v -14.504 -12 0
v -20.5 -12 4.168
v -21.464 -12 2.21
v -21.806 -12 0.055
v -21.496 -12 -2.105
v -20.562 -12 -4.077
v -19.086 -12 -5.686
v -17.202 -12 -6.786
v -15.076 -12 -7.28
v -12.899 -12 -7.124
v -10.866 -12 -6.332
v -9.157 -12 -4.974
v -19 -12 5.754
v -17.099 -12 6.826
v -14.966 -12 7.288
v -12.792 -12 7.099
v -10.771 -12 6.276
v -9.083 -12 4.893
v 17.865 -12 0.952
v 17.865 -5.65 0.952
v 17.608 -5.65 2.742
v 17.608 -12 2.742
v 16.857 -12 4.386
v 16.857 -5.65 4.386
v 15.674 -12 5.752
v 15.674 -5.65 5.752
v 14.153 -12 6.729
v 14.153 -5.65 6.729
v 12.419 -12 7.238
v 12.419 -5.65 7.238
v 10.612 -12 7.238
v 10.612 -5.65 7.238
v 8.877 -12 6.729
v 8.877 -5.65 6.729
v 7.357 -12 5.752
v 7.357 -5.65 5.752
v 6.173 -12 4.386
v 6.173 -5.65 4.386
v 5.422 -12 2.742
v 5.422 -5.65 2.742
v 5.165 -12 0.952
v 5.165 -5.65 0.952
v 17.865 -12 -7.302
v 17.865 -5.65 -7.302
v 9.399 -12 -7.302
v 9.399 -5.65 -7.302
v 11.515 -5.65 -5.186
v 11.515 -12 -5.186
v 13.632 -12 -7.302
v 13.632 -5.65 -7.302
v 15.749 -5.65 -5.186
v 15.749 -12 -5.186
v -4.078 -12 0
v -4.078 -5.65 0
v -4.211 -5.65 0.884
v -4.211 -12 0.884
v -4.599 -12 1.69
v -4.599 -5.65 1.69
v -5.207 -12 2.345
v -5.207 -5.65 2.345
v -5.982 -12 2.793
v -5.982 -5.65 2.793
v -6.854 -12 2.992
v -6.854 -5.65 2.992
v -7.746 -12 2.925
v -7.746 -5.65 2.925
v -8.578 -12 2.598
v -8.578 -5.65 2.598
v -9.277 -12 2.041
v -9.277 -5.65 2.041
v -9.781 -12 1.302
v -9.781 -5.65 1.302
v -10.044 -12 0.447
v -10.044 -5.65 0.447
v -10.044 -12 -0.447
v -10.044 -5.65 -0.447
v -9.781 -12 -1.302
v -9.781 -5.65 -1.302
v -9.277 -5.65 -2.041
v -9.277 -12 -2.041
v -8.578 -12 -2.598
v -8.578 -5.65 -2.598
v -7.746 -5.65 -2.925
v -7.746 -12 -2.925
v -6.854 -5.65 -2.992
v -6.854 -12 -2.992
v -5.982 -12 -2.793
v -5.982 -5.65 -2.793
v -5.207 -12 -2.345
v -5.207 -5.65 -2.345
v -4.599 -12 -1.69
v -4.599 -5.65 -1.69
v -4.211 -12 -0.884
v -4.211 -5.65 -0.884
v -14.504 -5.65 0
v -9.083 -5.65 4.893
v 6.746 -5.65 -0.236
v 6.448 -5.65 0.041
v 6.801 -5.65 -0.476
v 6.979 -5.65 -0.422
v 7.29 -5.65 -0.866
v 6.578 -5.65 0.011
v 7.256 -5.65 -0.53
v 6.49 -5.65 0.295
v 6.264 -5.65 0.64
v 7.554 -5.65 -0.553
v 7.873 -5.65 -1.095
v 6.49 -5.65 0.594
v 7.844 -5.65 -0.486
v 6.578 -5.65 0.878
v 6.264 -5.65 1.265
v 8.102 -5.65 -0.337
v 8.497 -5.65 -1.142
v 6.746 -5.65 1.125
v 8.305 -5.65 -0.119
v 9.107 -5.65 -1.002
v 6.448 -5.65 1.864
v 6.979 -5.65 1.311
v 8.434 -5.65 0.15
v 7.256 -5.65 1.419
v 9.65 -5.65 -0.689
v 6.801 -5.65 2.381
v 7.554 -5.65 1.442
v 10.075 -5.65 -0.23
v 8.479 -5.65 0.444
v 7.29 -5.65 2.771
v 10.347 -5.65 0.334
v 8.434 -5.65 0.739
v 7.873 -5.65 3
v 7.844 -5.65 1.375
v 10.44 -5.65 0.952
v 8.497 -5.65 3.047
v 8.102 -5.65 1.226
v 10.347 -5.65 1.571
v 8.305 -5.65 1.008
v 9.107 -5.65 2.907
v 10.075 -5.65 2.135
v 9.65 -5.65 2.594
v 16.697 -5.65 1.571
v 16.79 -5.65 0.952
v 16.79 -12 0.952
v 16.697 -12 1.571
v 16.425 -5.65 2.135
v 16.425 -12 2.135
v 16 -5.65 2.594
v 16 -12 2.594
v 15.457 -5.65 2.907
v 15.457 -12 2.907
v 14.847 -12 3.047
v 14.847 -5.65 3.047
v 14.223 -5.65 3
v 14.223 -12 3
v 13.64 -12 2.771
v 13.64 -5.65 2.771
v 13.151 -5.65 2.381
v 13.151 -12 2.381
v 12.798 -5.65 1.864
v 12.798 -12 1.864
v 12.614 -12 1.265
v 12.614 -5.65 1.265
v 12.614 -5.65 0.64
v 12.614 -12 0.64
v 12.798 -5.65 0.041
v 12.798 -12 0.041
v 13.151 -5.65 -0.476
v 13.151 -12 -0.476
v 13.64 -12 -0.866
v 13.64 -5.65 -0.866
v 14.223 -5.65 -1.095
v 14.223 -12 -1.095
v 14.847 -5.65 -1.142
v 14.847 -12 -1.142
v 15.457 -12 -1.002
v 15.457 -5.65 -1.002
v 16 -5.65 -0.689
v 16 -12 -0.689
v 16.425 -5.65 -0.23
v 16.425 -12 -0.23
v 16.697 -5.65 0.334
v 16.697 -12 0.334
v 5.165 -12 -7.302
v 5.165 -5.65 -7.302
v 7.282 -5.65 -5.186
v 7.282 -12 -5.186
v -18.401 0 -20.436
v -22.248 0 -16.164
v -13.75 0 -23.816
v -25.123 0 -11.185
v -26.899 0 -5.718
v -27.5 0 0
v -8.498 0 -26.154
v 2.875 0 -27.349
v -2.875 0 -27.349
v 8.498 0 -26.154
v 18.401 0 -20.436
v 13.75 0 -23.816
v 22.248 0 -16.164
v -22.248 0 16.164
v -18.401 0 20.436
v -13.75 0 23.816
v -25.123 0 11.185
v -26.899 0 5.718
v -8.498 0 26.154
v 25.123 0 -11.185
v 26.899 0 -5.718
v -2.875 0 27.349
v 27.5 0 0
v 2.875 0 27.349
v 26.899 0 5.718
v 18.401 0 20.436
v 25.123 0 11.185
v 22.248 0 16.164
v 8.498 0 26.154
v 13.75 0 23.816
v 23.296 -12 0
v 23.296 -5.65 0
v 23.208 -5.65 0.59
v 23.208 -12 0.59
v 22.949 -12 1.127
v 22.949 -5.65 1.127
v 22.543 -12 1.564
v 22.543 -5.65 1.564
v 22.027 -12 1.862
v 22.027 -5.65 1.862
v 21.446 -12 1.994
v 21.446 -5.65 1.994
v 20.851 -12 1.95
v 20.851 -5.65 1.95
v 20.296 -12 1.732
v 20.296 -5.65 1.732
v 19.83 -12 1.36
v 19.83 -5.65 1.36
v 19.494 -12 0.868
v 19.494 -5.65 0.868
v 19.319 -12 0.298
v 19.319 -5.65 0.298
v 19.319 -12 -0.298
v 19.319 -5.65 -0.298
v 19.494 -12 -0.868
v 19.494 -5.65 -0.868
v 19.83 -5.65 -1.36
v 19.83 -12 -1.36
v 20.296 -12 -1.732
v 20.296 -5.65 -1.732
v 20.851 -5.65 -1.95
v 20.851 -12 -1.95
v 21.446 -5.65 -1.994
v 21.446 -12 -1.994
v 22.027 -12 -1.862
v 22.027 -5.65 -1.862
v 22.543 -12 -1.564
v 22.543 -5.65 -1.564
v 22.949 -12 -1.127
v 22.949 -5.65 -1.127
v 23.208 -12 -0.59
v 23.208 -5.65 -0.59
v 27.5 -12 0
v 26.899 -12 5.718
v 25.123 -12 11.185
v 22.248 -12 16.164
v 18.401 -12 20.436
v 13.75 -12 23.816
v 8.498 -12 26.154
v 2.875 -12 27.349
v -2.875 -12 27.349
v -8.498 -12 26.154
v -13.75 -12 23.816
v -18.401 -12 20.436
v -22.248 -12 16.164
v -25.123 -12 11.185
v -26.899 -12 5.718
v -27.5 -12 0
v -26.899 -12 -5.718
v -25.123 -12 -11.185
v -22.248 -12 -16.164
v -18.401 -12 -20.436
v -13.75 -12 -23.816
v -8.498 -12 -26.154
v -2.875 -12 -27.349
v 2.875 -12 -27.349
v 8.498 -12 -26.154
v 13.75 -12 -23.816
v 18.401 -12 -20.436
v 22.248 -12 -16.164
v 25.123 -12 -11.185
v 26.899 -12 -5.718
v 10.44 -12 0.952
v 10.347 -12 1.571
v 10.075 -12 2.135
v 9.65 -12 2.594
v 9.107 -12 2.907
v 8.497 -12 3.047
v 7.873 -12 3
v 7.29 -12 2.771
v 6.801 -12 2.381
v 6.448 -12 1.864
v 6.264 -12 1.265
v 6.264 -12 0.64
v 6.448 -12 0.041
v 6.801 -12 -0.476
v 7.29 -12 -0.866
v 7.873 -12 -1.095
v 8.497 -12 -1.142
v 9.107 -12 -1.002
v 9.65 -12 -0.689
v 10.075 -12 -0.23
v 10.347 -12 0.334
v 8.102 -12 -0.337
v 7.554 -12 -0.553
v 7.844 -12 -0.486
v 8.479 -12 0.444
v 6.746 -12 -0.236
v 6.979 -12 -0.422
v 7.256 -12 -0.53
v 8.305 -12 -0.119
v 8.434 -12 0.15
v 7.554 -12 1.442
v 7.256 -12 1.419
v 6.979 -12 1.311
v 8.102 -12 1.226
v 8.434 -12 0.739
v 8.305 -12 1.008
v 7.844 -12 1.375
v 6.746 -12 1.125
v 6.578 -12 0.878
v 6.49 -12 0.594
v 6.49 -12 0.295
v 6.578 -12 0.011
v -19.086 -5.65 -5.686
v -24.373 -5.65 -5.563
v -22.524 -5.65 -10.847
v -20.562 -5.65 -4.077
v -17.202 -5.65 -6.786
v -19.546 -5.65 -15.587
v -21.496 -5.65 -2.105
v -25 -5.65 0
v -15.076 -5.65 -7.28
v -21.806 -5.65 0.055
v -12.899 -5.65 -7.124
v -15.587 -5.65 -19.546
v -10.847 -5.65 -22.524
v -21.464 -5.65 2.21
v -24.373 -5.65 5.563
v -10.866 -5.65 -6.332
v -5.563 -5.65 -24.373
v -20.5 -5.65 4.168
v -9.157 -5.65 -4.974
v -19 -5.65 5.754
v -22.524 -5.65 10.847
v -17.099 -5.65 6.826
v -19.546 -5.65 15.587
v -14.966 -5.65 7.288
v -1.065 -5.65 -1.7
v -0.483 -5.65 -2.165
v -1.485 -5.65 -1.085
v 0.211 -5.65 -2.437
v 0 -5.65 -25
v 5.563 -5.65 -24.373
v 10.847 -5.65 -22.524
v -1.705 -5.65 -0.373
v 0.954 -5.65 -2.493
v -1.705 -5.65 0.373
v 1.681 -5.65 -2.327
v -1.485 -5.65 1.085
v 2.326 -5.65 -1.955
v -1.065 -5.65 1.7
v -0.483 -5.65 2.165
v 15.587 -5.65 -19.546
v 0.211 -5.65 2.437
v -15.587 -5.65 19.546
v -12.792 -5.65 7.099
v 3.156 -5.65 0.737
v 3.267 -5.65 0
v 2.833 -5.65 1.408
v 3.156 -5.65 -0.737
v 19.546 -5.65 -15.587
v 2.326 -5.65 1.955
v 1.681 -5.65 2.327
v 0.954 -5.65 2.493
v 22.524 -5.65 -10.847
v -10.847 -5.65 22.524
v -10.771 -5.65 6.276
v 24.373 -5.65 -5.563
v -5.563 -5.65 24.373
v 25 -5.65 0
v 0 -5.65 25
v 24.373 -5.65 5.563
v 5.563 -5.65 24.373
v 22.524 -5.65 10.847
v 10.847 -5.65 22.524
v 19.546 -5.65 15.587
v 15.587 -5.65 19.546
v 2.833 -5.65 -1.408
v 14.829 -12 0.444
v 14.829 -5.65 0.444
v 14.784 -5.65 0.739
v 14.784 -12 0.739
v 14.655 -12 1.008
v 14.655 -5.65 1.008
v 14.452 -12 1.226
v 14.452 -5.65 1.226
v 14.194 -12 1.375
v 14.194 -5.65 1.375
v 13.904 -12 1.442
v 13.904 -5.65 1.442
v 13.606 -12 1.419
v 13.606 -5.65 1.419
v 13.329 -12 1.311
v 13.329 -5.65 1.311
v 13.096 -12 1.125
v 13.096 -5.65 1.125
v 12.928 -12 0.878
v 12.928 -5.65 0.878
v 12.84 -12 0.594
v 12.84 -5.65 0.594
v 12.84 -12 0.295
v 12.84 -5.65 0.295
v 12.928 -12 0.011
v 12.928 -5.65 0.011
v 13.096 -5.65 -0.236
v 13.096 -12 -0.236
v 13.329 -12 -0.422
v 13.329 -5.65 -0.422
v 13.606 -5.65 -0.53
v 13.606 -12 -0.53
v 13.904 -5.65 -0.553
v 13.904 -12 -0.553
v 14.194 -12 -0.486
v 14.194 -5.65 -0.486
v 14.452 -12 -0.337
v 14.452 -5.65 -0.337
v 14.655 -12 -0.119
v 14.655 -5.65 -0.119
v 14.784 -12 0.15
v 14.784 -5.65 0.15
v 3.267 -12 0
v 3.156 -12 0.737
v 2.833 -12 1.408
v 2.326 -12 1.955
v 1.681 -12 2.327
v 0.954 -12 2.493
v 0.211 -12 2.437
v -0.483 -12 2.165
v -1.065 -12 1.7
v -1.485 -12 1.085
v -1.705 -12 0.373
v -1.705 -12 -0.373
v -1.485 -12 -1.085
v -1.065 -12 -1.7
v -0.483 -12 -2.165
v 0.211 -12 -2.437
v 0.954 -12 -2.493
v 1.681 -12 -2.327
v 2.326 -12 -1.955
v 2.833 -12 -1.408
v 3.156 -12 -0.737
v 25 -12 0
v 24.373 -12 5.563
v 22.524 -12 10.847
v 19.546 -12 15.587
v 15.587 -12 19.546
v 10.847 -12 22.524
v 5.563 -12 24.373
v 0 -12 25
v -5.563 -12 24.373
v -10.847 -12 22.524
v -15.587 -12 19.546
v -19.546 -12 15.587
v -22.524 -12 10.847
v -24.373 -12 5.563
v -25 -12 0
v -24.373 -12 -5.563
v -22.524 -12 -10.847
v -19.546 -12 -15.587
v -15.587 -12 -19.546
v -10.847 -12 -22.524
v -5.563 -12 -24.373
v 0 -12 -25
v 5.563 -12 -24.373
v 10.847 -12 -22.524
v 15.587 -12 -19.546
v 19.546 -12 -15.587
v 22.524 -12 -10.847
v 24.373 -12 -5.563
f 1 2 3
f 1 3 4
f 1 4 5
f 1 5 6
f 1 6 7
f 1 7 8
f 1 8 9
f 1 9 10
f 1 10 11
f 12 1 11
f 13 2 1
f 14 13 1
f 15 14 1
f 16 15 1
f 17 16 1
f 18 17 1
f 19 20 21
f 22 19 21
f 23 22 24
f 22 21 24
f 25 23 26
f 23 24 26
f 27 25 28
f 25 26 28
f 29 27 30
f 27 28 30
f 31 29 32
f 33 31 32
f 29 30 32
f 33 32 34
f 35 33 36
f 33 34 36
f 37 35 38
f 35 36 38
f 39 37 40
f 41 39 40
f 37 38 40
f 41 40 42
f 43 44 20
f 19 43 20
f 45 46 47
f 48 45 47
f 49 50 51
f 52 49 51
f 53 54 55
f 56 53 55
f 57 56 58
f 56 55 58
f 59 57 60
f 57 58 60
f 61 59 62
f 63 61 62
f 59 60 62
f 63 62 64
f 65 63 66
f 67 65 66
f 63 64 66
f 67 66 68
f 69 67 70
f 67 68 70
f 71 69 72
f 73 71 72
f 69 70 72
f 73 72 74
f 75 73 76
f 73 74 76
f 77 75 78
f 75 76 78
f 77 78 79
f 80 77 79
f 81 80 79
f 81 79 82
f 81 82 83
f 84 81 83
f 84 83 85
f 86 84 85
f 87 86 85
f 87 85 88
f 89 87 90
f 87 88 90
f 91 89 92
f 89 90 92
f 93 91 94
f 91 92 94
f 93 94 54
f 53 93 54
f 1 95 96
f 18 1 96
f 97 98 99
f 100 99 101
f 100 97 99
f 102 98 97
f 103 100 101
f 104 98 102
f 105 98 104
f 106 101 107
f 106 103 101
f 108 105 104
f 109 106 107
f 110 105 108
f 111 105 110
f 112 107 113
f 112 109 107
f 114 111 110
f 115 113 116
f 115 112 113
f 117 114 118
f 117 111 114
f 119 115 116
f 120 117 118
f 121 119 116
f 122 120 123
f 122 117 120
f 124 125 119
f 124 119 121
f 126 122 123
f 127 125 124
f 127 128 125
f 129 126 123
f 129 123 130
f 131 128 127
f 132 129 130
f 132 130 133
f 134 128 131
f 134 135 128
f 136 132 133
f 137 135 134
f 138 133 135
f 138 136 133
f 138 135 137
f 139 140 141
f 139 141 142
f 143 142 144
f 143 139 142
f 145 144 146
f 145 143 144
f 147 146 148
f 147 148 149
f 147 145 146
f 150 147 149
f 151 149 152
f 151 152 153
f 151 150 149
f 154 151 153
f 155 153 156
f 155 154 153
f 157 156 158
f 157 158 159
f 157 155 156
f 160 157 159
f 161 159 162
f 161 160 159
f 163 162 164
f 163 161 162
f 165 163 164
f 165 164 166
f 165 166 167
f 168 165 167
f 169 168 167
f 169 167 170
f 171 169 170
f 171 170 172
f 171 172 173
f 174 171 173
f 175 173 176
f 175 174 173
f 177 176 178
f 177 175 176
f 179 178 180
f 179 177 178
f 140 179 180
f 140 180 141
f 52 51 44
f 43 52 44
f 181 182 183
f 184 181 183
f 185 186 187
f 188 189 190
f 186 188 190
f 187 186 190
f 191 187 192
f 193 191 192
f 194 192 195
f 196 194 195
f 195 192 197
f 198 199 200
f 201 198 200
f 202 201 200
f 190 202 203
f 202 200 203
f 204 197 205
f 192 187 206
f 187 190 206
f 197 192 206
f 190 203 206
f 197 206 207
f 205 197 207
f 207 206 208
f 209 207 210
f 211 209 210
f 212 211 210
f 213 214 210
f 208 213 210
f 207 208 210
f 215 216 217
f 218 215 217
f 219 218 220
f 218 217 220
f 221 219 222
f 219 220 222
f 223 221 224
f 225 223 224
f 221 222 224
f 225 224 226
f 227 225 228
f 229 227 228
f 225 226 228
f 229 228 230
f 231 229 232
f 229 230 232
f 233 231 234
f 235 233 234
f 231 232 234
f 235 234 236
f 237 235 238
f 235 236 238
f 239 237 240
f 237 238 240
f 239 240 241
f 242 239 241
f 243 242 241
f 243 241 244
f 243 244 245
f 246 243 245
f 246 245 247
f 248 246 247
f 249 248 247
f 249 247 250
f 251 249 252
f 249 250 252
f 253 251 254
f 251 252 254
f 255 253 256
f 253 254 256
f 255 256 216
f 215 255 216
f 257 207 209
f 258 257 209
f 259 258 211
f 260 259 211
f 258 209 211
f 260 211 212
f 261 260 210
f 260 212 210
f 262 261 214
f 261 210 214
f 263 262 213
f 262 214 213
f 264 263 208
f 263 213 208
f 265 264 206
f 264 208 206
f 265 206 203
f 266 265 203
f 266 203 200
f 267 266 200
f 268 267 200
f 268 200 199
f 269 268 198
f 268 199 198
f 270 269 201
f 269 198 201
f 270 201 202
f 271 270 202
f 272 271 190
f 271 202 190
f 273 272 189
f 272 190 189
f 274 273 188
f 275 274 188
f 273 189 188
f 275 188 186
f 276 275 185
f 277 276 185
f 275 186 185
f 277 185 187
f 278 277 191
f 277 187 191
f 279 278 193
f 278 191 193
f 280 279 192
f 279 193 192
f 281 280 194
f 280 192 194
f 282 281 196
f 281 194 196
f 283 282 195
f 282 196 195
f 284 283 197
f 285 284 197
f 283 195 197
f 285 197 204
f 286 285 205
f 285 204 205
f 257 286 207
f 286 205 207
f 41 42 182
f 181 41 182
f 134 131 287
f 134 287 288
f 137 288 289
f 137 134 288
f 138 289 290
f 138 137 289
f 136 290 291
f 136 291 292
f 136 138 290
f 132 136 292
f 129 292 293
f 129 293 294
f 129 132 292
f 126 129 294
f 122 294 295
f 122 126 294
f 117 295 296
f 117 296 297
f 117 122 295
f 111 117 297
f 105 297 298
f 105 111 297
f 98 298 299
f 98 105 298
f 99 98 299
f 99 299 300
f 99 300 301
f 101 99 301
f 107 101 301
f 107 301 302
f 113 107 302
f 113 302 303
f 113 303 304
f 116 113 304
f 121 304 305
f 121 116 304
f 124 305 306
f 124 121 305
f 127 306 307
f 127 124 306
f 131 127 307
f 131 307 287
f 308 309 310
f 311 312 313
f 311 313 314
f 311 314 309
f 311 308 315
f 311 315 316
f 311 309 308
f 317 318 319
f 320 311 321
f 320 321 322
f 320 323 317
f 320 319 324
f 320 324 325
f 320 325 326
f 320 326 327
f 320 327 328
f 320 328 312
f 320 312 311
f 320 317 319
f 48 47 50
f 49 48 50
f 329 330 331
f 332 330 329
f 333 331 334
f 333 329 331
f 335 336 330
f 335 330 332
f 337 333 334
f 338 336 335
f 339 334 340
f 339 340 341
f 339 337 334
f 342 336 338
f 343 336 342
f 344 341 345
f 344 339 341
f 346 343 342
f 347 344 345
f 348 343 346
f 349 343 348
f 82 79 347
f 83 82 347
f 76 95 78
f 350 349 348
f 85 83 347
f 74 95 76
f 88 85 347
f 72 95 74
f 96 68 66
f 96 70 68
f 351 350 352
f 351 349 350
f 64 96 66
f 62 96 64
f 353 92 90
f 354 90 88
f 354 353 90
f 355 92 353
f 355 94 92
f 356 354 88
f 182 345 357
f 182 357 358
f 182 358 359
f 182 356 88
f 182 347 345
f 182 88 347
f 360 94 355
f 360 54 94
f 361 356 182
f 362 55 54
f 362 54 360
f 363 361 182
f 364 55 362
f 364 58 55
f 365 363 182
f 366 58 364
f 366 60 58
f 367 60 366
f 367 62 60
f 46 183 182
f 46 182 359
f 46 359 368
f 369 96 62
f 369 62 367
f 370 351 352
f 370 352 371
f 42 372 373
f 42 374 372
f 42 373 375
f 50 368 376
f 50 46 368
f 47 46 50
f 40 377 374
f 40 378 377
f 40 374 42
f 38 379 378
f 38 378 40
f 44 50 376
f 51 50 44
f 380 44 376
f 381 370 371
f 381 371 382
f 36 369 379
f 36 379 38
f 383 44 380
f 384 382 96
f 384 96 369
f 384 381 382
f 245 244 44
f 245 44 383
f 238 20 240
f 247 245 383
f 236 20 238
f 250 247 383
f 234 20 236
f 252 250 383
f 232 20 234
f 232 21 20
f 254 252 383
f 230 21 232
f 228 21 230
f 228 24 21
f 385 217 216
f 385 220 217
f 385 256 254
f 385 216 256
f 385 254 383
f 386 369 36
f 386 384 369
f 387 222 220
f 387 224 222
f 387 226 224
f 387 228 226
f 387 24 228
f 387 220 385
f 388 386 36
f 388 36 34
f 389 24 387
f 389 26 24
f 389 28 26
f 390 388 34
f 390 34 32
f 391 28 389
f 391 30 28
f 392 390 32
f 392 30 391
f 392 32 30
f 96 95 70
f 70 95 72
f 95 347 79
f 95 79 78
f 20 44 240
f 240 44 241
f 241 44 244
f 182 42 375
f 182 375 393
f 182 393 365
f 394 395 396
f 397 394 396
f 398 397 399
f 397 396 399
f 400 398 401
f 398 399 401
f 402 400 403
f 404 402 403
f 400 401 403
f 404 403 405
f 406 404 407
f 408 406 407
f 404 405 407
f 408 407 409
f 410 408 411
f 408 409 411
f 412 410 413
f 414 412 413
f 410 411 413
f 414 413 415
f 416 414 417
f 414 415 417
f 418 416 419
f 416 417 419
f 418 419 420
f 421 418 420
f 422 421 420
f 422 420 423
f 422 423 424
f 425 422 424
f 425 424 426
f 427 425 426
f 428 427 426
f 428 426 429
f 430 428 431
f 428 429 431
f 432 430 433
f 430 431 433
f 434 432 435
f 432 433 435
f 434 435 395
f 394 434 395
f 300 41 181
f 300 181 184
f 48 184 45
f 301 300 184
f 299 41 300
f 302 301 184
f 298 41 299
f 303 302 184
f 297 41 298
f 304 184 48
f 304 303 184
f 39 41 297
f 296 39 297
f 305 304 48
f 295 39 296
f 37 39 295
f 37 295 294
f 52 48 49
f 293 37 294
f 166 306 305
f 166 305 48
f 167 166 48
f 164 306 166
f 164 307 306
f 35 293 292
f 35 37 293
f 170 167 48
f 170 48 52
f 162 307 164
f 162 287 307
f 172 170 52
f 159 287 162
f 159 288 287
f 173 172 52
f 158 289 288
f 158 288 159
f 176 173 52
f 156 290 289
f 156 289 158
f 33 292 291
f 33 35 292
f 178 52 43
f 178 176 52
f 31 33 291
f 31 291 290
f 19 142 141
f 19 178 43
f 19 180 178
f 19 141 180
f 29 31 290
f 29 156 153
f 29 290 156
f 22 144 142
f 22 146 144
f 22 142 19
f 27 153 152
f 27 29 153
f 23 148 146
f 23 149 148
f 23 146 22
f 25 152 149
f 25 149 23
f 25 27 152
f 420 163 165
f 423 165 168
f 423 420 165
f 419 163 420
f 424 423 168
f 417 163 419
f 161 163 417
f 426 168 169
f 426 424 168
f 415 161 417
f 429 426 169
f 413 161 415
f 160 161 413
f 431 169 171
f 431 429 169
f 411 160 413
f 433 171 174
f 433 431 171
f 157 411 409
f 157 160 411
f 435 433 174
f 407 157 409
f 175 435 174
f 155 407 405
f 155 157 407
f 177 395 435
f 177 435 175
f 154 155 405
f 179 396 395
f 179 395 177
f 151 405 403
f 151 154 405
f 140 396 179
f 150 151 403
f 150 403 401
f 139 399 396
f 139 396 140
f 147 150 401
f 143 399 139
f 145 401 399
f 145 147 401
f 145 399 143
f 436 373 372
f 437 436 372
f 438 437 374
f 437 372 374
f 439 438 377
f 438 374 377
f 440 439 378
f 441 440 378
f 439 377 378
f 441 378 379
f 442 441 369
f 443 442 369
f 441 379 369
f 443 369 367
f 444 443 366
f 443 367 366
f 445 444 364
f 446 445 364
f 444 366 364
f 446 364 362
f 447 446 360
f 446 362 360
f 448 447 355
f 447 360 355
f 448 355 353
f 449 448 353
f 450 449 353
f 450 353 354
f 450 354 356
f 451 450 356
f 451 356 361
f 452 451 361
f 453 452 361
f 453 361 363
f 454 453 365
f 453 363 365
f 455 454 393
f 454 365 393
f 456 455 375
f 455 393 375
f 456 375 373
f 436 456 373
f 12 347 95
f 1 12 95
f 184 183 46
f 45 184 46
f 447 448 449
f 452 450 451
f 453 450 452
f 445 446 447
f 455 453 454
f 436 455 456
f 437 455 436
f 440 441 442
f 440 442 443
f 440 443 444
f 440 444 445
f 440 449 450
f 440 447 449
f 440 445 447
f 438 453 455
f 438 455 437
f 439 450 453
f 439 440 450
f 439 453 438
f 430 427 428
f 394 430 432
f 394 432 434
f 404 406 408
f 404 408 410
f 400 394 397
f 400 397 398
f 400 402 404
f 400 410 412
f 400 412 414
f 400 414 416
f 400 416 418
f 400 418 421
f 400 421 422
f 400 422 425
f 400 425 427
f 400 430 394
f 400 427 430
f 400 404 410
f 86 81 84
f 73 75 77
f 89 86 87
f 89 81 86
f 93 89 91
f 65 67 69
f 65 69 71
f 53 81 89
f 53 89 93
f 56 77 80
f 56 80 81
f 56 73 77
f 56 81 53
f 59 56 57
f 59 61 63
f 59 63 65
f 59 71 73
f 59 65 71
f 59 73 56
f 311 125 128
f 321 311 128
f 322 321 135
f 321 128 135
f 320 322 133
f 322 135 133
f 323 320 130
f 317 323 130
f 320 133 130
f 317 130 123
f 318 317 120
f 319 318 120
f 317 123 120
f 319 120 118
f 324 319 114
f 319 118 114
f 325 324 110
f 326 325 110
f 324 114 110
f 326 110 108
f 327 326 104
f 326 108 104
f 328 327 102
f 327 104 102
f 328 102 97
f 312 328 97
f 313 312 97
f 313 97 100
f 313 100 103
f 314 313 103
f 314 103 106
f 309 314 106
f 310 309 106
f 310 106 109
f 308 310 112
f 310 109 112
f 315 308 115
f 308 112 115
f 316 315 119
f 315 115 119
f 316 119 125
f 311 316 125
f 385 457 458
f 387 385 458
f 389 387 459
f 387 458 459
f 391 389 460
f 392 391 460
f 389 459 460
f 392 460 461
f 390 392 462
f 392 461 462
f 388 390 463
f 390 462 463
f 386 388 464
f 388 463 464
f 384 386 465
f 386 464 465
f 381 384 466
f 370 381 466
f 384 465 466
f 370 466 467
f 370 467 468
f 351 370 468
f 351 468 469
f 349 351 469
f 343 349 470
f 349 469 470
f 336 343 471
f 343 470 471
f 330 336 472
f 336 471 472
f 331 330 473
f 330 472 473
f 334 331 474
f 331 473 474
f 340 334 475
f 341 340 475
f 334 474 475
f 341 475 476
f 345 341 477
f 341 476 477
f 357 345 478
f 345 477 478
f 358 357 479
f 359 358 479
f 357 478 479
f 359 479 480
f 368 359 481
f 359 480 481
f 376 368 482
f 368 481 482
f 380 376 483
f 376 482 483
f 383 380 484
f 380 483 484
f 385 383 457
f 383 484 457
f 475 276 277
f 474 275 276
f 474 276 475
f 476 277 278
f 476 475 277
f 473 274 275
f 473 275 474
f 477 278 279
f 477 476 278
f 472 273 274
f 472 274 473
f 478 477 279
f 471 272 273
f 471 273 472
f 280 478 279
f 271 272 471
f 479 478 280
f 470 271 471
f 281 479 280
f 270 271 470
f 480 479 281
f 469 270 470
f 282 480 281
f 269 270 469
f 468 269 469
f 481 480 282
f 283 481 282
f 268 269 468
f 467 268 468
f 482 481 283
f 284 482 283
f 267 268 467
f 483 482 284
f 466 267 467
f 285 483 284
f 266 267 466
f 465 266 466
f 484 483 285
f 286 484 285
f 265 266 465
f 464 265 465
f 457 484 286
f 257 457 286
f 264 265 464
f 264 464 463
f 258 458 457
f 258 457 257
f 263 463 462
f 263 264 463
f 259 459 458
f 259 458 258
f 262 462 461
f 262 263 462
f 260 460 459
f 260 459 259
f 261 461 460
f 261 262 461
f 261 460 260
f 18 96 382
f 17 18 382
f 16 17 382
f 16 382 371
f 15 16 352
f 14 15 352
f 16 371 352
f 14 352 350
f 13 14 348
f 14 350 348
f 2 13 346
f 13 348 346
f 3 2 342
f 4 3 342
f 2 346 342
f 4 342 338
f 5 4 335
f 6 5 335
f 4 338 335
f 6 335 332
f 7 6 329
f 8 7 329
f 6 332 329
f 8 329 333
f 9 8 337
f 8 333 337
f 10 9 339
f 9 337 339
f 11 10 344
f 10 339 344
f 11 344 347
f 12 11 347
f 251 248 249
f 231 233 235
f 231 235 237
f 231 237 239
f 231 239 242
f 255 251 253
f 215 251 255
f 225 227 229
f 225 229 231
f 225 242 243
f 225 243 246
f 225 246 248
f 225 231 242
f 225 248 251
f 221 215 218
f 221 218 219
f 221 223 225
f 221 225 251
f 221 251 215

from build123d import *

# Parameters (mm, degrees)
F0_R     = 27.5
F1_DEPTH = 12
F2_R     = 25
F3_DEPTH = 6.35
F4_R     = 3
F4_R_2   = 2.1
F4_R_3   = 2.5
F4_R_4   = 2
F4_R_5   = 1
F5_DEPTH = 6.35


with BuildPart() as f1:
    # F0 (on Front) → F1 (new body)
    with BuildSketch(Plane.XZ):
        Circle(F0_R)
    extrude(amount=F1_DEPTH)

    # F2 (on face) → F3 (cut)
    with BuildSketch(Plane.XZ.offset(12)):
        Circle(F2_R)
    extrude(amount=-F3_DEPTH, mode=Mode.SUBTRACT)

    # F4 (on face) → F5 (join)
    with BuildSketch(Plane.XZ.offset(5.65)):
        with BuildLine():
            Line((-14.503664, 0), (-9.082651, 4.892762))
            ThreePointArc((-9.082651, 4.892762), (-21.805957, 0.055061), (-9.157048, -4.973953))
            Line((-9.157048, -4.973953), (-14.503664, 0))
        make_face()
        with Locations((-7.077939, 0)):
            Circle(F4_R)
        with BuildLine():
            ThreePointArc((17.865209, 0.9525), (11.515209, 7.3025), (5.165209, 0.9525))
            Line((5.165209, 0.9525), (5.165209, -7.3025))
            Line((5.165209, -7.3025), (7.281875, -5.185833))
            Line((7.281875, -5.185833), (9.398542, -7.3025))
            Line((9.398542, -7.3025), (11.515209, -5.185833))
            Line((11.515209, -5.185833), (13.631875, -7.3025))
            Line((13.631875, -7.3025), (15.748542, -5.185833))
            Line((15.748542, -5.185833), (17.865209, -7.3025))
            Line((17.865209, -7.3025), (17.865209, 0.9525))
        make_face()
        with Locations((8.340209, 0.9525)):
            Circle(F4_R_2, mode=Mode.SUBTRACT)
        with Locations((14.690209, 0.9525)):
            Circle(F4_R_2, mode=Mode.SUBTRACT)
        with Locations((0.767446, 0)):
            Circle(F4_R_3)
        with Locations((21.29638, 0)):
            Circle(F4_R_4)
        with Locations((7.478851, 0.4445)):
            Circle(F4_R_5)
        with Locations((13.828851, 0.4445)):
            Circle(F4_R_5)
    extrude(amount=F5_DEPTH)


solid = f1.part
